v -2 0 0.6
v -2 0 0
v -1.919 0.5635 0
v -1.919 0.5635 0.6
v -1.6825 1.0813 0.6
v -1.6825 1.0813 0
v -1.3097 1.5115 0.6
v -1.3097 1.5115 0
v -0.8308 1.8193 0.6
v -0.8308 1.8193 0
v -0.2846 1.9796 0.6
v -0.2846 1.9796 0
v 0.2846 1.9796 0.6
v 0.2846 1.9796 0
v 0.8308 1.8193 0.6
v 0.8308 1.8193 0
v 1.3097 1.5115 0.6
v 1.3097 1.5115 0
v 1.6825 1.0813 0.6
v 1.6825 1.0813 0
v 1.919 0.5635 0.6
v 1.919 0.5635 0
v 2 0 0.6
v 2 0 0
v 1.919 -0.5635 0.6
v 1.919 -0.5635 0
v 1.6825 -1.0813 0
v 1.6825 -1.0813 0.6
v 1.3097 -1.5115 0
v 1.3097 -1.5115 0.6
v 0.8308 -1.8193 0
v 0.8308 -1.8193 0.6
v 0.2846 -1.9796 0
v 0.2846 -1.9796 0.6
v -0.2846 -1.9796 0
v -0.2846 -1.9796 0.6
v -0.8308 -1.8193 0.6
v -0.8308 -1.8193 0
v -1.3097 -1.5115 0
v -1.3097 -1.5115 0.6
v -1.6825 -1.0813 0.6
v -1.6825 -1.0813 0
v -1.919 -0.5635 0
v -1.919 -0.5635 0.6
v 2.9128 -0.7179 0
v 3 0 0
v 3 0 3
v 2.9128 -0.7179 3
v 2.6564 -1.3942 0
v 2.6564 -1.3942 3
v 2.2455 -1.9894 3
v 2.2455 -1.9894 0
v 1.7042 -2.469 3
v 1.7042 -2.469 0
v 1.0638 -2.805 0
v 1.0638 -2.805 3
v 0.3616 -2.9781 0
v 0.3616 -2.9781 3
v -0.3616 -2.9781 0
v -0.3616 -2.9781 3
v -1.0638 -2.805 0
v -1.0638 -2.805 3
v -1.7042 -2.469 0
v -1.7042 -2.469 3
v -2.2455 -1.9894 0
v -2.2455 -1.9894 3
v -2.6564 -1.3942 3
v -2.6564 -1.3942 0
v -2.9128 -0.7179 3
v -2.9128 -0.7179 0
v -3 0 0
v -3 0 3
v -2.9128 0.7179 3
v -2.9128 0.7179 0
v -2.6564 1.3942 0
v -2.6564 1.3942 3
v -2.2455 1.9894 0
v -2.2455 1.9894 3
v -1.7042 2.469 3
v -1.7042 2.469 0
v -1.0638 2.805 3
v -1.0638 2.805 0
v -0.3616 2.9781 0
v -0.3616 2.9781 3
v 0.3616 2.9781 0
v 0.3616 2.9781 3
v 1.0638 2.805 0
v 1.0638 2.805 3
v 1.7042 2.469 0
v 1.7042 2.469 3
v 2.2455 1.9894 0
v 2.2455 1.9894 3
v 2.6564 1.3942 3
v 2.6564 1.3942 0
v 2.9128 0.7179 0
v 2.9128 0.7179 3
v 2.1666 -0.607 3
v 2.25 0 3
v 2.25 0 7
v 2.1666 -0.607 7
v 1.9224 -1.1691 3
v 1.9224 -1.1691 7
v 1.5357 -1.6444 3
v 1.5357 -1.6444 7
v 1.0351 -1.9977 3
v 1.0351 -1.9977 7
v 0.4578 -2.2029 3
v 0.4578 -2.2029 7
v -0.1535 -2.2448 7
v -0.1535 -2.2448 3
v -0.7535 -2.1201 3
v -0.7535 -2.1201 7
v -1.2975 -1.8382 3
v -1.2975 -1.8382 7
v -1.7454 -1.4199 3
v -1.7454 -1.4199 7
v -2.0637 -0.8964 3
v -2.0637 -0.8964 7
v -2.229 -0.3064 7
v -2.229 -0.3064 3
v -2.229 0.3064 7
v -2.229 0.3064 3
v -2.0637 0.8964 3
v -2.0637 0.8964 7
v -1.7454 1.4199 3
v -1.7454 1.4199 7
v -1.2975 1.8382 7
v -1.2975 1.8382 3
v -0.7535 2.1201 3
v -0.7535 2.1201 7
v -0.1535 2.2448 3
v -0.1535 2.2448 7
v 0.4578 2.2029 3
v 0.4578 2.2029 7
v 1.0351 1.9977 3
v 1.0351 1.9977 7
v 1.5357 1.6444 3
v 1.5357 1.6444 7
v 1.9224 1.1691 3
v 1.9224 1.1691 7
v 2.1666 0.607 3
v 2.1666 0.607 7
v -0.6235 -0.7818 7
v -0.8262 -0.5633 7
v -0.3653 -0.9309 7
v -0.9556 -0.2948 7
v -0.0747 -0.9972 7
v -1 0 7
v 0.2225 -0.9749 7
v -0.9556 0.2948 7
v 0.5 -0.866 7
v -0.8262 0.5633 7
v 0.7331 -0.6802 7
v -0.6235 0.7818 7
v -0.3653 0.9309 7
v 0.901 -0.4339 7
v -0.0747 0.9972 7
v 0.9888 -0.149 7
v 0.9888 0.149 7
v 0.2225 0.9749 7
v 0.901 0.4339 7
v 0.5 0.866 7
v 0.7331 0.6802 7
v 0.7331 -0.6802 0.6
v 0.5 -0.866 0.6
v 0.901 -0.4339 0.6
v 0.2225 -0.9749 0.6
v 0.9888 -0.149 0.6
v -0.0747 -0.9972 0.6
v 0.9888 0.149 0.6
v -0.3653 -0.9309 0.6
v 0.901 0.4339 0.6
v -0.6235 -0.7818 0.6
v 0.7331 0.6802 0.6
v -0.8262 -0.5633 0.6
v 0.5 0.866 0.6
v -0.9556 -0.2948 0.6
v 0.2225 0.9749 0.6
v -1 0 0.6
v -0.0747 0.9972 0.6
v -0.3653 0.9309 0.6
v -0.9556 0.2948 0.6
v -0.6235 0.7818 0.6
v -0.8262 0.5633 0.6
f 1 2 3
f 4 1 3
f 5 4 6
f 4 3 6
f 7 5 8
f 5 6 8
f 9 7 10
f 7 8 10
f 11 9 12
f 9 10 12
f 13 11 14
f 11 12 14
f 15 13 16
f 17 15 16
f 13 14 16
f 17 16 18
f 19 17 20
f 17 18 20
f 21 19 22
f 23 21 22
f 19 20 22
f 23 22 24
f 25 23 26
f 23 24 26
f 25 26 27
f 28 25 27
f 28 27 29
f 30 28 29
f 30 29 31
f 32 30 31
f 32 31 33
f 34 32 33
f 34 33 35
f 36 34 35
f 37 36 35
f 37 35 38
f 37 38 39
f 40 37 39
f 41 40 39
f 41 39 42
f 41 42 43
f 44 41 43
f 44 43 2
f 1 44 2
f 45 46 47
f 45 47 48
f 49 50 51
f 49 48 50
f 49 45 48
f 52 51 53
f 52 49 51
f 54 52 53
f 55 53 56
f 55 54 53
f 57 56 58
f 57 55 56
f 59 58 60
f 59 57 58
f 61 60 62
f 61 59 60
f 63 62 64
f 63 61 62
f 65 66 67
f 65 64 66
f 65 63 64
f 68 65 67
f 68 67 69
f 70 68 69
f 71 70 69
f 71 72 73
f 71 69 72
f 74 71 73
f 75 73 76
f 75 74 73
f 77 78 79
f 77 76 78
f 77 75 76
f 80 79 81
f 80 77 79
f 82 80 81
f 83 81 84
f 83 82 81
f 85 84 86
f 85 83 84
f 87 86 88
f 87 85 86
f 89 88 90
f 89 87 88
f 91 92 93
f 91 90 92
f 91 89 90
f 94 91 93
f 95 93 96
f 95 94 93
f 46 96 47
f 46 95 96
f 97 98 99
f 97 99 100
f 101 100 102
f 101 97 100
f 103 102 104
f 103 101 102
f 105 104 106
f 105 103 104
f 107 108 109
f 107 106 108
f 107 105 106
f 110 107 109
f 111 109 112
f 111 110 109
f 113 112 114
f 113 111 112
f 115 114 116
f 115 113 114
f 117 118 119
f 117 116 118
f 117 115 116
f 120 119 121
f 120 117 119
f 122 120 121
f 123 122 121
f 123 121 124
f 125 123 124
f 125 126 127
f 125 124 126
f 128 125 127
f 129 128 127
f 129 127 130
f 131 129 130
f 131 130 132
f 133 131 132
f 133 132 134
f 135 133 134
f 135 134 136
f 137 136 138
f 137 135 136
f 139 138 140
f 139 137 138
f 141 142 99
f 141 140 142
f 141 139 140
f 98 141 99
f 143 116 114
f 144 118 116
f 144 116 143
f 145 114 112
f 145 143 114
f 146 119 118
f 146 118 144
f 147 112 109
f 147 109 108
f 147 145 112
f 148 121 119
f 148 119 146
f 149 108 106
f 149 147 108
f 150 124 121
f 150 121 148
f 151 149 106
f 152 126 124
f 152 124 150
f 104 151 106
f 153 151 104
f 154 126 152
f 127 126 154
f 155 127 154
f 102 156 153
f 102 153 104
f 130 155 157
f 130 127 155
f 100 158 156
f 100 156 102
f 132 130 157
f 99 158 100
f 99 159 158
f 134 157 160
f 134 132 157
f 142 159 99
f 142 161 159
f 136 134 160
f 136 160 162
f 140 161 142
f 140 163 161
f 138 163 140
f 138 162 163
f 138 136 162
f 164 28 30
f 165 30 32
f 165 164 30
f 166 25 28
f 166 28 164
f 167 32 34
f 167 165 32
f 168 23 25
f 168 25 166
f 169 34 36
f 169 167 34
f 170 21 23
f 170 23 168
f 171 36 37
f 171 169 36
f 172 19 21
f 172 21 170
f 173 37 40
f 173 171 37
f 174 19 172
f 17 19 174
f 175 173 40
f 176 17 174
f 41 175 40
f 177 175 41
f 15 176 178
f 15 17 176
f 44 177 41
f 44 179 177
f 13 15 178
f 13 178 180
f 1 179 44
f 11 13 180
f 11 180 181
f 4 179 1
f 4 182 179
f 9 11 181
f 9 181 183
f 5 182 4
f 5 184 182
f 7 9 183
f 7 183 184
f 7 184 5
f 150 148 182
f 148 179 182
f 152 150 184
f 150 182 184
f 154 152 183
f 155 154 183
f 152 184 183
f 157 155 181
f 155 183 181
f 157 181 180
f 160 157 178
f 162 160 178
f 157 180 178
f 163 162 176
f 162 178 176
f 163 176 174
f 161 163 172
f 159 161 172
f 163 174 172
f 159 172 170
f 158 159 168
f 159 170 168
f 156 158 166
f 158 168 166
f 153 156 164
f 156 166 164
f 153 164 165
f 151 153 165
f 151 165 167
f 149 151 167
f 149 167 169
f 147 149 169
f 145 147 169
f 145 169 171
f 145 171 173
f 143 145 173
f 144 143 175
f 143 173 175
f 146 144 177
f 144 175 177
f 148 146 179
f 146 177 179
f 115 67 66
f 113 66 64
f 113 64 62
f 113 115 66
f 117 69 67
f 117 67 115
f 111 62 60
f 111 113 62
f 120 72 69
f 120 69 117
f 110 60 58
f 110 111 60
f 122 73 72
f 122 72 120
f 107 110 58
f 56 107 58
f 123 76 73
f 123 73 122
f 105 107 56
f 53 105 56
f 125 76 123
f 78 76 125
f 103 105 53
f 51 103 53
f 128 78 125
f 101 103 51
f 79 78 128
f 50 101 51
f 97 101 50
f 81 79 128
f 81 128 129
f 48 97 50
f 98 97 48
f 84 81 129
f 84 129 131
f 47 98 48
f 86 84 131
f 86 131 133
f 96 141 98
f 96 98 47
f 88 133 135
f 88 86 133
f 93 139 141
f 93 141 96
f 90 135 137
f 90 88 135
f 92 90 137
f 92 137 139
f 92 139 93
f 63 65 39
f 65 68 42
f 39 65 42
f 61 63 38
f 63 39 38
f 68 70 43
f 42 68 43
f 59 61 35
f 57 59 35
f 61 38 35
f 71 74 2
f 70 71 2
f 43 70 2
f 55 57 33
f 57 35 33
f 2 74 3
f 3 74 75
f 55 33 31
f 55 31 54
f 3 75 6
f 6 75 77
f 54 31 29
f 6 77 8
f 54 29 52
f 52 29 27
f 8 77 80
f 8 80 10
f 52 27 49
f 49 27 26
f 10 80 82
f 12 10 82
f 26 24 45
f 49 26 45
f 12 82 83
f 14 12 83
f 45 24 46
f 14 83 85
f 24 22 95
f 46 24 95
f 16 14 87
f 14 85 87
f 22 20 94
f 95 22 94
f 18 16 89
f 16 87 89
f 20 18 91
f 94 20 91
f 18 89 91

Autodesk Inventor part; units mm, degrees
ref_plane "YZ Plane" through (0, 0, 0) normal (1, 0, 0) x (0, 1, 0)
ref_plane "XZ Plane" through (0, 0, 0) normal (0, 1, 0) x (-1, 0, 0)
ref_plane "XY Plane" through (0, 0, 0) normal (0, 0, 1) x (1, 0, 0)
sketch "スケッチ1" plane through (0, 0, 0) normal (0, 0, 1) x (1, 0, 0)
  circle A0 centre (0, 0) radius 3
  dimension "d0" = 6
extrude "押し出し1" add sketch "スケッチ1" along normal blind 3
sketch "スケッチ2" plane through (0, 0, 3) normal (0, 0, 1) x (1, 0, 0)
  circle A0 centre (0, 0) radius 2.25
  dimension "d3" = 4.5
extrude "押し出し2" add sketch "スケッチ2" along normal blind 4
sketch "スケッチ3" plane through (0, 0, 0) normal (0, 0, -1) x (-1, 0, 0)
  circle A0 centre (0, 0) radius 2
  dimension "d6" = 4
extrude "押し出し3" cut sketch "スケッチ3" against normal blind 0.6
sketch "スケッチ4" plane through (0, 0, 0) normal (0, 0, -1) x (-1, 0, 0)
  circle A0 centre (0, 0) radius 1
  dimension "d9" = 2
extrude "押し出し4" cut sketch "スケッチ4" against normal through all
properties part number "RD009_ギアDS0.5-12" material "PVC、無可塑"
